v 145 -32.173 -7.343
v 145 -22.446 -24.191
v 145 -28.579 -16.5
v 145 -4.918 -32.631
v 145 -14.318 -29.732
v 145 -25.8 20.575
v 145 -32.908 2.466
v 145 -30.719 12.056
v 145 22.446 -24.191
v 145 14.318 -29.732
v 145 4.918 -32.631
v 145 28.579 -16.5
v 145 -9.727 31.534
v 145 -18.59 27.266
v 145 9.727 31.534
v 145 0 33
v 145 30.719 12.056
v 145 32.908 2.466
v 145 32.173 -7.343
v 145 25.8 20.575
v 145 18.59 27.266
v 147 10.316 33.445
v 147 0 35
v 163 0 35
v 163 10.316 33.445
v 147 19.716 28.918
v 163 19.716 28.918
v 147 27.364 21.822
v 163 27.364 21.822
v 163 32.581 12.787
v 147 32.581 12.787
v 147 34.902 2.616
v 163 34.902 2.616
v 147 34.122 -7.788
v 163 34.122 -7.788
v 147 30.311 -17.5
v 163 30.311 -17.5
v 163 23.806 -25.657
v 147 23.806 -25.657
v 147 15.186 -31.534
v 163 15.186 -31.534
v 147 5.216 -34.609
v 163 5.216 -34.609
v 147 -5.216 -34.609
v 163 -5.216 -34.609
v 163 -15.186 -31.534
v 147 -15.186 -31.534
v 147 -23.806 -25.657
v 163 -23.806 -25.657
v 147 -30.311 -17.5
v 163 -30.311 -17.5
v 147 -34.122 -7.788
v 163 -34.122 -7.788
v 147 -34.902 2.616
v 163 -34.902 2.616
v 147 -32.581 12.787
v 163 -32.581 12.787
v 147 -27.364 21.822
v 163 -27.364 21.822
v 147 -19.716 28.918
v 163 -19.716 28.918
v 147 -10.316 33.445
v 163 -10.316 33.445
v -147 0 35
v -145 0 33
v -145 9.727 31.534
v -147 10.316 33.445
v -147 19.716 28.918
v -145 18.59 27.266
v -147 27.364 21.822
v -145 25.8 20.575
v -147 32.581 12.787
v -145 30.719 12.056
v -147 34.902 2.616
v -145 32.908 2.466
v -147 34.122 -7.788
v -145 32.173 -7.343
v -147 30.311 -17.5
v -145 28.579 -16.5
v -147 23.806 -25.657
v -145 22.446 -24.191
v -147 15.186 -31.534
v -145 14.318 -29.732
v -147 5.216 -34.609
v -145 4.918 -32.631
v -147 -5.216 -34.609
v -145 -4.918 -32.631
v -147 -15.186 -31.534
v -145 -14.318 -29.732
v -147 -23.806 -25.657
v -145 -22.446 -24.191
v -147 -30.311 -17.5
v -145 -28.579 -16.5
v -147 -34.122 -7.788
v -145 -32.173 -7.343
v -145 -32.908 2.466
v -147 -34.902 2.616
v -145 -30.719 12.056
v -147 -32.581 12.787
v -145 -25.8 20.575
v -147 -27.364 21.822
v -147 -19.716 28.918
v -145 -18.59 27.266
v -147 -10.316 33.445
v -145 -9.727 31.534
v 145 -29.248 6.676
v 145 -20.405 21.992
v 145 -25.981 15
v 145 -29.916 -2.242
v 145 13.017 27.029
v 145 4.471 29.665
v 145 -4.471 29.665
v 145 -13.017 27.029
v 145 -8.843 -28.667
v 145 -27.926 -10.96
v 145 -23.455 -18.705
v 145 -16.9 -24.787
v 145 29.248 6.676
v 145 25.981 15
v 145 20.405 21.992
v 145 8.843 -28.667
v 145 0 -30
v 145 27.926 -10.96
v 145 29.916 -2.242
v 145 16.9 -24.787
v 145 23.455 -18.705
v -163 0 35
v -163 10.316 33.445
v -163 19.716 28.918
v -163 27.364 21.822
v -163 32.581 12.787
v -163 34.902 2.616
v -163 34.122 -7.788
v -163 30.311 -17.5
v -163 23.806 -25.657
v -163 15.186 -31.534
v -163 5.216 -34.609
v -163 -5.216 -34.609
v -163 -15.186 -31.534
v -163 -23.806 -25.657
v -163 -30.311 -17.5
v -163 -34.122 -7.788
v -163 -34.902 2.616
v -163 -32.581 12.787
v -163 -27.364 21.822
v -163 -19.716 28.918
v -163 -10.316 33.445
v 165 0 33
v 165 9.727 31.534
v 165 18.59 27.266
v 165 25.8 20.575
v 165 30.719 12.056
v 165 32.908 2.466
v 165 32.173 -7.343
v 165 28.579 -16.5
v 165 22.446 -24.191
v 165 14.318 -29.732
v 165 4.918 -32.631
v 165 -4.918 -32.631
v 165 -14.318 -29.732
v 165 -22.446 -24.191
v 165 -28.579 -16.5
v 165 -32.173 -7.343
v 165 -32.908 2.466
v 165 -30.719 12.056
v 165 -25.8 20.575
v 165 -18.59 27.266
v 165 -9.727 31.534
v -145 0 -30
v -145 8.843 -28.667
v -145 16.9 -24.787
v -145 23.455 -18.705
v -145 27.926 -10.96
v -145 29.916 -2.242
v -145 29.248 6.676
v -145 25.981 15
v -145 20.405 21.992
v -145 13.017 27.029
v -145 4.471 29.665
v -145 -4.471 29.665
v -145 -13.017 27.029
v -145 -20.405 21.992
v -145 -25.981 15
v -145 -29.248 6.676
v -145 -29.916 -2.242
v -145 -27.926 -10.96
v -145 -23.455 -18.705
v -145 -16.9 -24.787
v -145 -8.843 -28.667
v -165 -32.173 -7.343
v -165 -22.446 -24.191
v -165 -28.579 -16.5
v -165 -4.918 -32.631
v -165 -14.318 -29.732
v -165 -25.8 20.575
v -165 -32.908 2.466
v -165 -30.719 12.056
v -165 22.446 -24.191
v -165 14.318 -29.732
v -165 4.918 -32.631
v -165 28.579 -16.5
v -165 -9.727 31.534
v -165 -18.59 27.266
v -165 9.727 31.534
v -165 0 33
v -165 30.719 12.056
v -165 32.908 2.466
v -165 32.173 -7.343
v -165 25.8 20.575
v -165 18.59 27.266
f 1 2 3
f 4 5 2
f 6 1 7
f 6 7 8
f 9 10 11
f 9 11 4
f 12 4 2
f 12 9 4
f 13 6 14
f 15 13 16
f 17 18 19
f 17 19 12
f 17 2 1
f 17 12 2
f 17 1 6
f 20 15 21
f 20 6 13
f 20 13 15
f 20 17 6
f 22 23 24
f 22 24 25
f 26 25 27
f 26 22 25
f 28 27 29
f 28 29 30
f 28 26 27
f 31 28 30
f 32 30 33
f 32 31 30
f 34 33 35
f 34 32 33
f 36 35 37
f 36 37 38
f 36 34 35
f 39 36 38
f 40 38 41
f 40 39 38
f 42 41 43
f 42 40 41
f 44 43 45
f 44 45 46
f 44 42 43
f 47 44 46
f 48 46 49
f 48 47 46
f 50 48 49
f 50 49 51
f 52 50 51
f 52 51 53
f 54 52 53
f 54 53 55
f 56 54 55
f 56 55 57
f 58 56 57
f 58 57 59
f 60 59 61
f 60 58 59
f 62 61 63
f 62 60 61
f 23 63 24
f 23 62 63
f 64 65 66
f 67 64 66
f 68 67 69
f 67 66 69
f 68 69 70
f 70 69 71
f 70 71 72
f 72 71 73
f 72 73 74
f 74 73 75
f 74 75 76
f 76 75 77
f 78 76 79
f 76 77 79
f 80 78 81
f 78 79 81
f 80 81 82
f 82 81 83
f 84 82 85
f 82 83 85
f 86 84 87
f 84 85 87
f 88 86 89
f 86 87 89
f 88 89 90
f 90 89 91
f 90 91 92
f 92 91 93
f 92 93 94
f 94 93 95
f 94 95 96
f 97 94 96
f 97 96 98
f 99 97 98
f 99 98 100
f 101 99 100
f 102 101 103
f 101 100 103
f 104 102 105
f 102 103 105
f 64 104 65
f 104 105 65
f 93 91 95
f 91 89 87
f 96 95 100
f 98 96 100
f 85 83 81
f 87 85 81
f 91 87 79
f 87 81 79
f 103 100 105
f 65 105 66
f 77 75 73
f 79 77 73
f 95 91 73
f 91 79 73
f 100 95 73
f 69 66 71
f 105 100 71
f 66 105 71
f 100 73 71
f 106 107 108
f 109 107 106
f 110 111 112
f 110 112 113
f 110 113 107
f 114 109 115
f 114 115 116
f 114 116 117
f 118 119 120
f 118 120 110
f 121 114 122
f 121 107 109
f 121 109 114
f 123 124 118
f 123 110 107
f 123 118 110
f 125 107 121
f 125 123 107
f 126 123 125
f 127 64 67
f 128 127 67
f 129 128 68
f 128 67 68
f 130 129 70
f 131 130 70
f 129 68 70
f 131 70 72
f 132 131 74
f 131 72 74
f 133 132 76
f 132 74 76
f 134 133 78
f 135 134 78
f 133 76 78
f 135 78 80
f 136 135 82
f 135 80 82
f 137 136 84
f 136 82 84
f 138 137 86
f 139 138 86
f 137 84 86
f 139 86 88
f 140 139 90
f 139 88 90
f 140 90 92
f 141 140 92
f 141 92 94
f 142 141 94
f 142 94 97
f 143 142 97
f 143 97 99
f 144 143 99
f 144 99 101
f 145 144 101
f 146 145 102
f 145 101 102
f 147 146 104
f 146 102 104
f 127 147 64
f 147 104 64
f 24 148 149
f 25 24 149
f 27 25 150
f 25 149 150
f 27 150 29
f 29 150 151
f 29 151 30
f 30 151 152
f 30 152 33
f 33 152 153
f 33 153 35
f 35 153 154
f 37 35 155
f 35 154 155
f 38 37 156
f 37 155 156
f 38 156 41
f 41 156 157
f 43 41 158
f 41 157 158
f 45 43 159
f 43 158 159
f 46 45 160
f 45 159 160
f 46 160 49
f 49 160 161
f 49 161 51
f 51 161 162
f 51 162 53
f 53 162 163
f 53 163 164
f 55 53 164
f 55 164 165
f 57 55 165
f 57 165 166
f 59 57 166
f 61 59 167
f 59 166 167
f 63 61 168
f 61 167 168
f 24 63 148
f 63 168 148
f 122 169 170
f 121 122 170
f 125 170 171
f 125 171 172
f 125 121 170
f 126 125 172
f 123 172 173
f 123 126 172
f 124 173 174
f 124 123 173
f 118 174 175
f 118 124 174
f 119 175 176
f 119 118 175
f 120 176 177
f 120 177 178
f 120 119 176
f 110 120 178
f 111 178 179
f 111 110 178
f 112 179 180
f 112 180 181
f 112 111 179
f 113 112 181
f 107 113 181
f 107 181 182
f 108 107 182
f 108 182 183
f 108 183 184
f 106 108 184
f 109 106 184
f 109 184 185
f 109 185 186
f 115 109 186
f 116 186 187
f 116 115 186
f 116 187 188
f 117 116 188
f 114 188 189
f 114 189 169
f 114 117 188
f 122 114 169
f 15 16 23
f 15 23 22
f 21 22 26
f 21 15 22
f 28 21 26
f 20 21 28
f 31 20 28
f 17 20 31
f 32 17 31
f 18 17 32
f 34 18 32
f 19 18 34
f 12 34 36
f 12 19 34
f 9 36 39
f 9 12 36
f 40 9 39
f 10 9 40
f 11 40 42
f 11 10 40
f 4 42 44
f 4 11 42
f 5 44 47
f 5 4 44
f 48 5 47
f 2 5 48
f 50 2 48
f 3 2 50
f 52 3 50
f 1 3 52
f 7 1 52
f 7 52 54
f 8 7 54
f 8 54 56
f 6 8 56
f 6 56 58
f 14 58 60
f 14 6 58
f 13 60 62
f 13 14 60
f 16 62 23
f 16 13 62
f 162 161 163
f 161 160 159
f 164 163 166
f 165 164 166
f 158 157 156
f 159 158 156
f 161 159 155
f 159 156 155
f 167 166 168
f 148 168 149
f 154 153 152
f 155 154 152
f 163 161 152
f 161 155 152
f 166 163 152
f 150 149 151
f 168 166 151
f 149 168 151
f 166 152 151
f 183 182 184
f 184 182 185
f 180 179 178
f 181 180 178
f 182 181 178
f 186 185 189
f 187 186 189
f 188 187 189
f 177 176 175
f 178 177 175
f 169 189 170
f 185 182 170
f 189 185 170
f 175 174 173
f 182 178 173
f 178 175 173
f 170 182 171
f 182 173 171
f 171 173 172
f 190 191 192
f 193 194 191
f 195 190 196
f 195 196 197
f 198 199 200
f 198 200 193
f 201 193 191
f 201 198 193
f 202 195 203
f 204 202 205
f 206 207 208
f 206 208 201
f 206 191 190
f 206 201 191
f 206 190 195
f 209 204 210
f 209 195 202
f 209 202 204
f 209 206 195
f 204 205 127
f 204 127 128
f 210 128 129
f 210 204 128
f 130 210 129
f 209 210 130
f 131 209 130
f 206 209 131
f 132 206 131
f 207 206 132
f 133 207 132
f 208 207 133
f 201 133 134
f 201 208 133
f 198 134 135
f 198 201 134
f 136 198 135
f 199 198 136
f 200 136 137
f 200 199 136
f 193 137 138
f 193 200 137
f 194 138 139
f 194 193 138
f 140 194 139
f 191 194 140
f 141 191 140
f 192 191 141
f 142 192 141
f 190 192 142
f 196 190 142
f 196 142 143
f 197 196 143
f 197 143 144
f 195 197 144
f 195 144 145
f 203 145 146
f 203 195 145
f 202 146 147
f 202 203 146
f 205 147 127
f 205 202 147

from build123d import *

# Parameters (mm, degrees)
SKETCH1_R           = 30
BOSS_EXTRUDE1_DEPTH = 145
SKETCH2_R           = 35
BOSS_EXTRUDE2_DEPTH = 20
CHAMFER1_SIZE       = 2


with BuildPart() as part:
    # Sketch1 → Boss-Extrude1 (new, symmetric)
    with BuildSketch(Plane(origin=(0, 0, 0), x_dir=(0, 0, -1), z_dir=(1, 0, 0))):
        Circle(SKETCH1_R)
    extrude(amount=BOSS_EXTRUDE1_DEPTH, both=True)


with BuildPart() as body_2:
    # Sketch2 → Boss-Extrude2 (new body)
    with BuildSketch(Plane.ZY.offset(145)):
        Circle(SKETCH2_R)
    extrude(amount=BOSS_EXTRUDE2_DEPTH)

    # Chamfer1
    chamfer1_edges = [body_2.edges().sort_by_distance(p)[0] for p in [
        (-145, 0, -35),
        (-165, 0, -35),
    ]]
    chamfer(chamfer1_edges, length=CHAMFER1_SIZE)


with BuildPart() as body_3:
    # Mirror1: mirrored copy
    add(body_2.part.mirror(Plane(origin=(0, 0, 0), x_dir=(0, 0, 1), z_dir=(1, 0, 0))))


solid = Compound([part.part, body_2.part, body_3.part])
